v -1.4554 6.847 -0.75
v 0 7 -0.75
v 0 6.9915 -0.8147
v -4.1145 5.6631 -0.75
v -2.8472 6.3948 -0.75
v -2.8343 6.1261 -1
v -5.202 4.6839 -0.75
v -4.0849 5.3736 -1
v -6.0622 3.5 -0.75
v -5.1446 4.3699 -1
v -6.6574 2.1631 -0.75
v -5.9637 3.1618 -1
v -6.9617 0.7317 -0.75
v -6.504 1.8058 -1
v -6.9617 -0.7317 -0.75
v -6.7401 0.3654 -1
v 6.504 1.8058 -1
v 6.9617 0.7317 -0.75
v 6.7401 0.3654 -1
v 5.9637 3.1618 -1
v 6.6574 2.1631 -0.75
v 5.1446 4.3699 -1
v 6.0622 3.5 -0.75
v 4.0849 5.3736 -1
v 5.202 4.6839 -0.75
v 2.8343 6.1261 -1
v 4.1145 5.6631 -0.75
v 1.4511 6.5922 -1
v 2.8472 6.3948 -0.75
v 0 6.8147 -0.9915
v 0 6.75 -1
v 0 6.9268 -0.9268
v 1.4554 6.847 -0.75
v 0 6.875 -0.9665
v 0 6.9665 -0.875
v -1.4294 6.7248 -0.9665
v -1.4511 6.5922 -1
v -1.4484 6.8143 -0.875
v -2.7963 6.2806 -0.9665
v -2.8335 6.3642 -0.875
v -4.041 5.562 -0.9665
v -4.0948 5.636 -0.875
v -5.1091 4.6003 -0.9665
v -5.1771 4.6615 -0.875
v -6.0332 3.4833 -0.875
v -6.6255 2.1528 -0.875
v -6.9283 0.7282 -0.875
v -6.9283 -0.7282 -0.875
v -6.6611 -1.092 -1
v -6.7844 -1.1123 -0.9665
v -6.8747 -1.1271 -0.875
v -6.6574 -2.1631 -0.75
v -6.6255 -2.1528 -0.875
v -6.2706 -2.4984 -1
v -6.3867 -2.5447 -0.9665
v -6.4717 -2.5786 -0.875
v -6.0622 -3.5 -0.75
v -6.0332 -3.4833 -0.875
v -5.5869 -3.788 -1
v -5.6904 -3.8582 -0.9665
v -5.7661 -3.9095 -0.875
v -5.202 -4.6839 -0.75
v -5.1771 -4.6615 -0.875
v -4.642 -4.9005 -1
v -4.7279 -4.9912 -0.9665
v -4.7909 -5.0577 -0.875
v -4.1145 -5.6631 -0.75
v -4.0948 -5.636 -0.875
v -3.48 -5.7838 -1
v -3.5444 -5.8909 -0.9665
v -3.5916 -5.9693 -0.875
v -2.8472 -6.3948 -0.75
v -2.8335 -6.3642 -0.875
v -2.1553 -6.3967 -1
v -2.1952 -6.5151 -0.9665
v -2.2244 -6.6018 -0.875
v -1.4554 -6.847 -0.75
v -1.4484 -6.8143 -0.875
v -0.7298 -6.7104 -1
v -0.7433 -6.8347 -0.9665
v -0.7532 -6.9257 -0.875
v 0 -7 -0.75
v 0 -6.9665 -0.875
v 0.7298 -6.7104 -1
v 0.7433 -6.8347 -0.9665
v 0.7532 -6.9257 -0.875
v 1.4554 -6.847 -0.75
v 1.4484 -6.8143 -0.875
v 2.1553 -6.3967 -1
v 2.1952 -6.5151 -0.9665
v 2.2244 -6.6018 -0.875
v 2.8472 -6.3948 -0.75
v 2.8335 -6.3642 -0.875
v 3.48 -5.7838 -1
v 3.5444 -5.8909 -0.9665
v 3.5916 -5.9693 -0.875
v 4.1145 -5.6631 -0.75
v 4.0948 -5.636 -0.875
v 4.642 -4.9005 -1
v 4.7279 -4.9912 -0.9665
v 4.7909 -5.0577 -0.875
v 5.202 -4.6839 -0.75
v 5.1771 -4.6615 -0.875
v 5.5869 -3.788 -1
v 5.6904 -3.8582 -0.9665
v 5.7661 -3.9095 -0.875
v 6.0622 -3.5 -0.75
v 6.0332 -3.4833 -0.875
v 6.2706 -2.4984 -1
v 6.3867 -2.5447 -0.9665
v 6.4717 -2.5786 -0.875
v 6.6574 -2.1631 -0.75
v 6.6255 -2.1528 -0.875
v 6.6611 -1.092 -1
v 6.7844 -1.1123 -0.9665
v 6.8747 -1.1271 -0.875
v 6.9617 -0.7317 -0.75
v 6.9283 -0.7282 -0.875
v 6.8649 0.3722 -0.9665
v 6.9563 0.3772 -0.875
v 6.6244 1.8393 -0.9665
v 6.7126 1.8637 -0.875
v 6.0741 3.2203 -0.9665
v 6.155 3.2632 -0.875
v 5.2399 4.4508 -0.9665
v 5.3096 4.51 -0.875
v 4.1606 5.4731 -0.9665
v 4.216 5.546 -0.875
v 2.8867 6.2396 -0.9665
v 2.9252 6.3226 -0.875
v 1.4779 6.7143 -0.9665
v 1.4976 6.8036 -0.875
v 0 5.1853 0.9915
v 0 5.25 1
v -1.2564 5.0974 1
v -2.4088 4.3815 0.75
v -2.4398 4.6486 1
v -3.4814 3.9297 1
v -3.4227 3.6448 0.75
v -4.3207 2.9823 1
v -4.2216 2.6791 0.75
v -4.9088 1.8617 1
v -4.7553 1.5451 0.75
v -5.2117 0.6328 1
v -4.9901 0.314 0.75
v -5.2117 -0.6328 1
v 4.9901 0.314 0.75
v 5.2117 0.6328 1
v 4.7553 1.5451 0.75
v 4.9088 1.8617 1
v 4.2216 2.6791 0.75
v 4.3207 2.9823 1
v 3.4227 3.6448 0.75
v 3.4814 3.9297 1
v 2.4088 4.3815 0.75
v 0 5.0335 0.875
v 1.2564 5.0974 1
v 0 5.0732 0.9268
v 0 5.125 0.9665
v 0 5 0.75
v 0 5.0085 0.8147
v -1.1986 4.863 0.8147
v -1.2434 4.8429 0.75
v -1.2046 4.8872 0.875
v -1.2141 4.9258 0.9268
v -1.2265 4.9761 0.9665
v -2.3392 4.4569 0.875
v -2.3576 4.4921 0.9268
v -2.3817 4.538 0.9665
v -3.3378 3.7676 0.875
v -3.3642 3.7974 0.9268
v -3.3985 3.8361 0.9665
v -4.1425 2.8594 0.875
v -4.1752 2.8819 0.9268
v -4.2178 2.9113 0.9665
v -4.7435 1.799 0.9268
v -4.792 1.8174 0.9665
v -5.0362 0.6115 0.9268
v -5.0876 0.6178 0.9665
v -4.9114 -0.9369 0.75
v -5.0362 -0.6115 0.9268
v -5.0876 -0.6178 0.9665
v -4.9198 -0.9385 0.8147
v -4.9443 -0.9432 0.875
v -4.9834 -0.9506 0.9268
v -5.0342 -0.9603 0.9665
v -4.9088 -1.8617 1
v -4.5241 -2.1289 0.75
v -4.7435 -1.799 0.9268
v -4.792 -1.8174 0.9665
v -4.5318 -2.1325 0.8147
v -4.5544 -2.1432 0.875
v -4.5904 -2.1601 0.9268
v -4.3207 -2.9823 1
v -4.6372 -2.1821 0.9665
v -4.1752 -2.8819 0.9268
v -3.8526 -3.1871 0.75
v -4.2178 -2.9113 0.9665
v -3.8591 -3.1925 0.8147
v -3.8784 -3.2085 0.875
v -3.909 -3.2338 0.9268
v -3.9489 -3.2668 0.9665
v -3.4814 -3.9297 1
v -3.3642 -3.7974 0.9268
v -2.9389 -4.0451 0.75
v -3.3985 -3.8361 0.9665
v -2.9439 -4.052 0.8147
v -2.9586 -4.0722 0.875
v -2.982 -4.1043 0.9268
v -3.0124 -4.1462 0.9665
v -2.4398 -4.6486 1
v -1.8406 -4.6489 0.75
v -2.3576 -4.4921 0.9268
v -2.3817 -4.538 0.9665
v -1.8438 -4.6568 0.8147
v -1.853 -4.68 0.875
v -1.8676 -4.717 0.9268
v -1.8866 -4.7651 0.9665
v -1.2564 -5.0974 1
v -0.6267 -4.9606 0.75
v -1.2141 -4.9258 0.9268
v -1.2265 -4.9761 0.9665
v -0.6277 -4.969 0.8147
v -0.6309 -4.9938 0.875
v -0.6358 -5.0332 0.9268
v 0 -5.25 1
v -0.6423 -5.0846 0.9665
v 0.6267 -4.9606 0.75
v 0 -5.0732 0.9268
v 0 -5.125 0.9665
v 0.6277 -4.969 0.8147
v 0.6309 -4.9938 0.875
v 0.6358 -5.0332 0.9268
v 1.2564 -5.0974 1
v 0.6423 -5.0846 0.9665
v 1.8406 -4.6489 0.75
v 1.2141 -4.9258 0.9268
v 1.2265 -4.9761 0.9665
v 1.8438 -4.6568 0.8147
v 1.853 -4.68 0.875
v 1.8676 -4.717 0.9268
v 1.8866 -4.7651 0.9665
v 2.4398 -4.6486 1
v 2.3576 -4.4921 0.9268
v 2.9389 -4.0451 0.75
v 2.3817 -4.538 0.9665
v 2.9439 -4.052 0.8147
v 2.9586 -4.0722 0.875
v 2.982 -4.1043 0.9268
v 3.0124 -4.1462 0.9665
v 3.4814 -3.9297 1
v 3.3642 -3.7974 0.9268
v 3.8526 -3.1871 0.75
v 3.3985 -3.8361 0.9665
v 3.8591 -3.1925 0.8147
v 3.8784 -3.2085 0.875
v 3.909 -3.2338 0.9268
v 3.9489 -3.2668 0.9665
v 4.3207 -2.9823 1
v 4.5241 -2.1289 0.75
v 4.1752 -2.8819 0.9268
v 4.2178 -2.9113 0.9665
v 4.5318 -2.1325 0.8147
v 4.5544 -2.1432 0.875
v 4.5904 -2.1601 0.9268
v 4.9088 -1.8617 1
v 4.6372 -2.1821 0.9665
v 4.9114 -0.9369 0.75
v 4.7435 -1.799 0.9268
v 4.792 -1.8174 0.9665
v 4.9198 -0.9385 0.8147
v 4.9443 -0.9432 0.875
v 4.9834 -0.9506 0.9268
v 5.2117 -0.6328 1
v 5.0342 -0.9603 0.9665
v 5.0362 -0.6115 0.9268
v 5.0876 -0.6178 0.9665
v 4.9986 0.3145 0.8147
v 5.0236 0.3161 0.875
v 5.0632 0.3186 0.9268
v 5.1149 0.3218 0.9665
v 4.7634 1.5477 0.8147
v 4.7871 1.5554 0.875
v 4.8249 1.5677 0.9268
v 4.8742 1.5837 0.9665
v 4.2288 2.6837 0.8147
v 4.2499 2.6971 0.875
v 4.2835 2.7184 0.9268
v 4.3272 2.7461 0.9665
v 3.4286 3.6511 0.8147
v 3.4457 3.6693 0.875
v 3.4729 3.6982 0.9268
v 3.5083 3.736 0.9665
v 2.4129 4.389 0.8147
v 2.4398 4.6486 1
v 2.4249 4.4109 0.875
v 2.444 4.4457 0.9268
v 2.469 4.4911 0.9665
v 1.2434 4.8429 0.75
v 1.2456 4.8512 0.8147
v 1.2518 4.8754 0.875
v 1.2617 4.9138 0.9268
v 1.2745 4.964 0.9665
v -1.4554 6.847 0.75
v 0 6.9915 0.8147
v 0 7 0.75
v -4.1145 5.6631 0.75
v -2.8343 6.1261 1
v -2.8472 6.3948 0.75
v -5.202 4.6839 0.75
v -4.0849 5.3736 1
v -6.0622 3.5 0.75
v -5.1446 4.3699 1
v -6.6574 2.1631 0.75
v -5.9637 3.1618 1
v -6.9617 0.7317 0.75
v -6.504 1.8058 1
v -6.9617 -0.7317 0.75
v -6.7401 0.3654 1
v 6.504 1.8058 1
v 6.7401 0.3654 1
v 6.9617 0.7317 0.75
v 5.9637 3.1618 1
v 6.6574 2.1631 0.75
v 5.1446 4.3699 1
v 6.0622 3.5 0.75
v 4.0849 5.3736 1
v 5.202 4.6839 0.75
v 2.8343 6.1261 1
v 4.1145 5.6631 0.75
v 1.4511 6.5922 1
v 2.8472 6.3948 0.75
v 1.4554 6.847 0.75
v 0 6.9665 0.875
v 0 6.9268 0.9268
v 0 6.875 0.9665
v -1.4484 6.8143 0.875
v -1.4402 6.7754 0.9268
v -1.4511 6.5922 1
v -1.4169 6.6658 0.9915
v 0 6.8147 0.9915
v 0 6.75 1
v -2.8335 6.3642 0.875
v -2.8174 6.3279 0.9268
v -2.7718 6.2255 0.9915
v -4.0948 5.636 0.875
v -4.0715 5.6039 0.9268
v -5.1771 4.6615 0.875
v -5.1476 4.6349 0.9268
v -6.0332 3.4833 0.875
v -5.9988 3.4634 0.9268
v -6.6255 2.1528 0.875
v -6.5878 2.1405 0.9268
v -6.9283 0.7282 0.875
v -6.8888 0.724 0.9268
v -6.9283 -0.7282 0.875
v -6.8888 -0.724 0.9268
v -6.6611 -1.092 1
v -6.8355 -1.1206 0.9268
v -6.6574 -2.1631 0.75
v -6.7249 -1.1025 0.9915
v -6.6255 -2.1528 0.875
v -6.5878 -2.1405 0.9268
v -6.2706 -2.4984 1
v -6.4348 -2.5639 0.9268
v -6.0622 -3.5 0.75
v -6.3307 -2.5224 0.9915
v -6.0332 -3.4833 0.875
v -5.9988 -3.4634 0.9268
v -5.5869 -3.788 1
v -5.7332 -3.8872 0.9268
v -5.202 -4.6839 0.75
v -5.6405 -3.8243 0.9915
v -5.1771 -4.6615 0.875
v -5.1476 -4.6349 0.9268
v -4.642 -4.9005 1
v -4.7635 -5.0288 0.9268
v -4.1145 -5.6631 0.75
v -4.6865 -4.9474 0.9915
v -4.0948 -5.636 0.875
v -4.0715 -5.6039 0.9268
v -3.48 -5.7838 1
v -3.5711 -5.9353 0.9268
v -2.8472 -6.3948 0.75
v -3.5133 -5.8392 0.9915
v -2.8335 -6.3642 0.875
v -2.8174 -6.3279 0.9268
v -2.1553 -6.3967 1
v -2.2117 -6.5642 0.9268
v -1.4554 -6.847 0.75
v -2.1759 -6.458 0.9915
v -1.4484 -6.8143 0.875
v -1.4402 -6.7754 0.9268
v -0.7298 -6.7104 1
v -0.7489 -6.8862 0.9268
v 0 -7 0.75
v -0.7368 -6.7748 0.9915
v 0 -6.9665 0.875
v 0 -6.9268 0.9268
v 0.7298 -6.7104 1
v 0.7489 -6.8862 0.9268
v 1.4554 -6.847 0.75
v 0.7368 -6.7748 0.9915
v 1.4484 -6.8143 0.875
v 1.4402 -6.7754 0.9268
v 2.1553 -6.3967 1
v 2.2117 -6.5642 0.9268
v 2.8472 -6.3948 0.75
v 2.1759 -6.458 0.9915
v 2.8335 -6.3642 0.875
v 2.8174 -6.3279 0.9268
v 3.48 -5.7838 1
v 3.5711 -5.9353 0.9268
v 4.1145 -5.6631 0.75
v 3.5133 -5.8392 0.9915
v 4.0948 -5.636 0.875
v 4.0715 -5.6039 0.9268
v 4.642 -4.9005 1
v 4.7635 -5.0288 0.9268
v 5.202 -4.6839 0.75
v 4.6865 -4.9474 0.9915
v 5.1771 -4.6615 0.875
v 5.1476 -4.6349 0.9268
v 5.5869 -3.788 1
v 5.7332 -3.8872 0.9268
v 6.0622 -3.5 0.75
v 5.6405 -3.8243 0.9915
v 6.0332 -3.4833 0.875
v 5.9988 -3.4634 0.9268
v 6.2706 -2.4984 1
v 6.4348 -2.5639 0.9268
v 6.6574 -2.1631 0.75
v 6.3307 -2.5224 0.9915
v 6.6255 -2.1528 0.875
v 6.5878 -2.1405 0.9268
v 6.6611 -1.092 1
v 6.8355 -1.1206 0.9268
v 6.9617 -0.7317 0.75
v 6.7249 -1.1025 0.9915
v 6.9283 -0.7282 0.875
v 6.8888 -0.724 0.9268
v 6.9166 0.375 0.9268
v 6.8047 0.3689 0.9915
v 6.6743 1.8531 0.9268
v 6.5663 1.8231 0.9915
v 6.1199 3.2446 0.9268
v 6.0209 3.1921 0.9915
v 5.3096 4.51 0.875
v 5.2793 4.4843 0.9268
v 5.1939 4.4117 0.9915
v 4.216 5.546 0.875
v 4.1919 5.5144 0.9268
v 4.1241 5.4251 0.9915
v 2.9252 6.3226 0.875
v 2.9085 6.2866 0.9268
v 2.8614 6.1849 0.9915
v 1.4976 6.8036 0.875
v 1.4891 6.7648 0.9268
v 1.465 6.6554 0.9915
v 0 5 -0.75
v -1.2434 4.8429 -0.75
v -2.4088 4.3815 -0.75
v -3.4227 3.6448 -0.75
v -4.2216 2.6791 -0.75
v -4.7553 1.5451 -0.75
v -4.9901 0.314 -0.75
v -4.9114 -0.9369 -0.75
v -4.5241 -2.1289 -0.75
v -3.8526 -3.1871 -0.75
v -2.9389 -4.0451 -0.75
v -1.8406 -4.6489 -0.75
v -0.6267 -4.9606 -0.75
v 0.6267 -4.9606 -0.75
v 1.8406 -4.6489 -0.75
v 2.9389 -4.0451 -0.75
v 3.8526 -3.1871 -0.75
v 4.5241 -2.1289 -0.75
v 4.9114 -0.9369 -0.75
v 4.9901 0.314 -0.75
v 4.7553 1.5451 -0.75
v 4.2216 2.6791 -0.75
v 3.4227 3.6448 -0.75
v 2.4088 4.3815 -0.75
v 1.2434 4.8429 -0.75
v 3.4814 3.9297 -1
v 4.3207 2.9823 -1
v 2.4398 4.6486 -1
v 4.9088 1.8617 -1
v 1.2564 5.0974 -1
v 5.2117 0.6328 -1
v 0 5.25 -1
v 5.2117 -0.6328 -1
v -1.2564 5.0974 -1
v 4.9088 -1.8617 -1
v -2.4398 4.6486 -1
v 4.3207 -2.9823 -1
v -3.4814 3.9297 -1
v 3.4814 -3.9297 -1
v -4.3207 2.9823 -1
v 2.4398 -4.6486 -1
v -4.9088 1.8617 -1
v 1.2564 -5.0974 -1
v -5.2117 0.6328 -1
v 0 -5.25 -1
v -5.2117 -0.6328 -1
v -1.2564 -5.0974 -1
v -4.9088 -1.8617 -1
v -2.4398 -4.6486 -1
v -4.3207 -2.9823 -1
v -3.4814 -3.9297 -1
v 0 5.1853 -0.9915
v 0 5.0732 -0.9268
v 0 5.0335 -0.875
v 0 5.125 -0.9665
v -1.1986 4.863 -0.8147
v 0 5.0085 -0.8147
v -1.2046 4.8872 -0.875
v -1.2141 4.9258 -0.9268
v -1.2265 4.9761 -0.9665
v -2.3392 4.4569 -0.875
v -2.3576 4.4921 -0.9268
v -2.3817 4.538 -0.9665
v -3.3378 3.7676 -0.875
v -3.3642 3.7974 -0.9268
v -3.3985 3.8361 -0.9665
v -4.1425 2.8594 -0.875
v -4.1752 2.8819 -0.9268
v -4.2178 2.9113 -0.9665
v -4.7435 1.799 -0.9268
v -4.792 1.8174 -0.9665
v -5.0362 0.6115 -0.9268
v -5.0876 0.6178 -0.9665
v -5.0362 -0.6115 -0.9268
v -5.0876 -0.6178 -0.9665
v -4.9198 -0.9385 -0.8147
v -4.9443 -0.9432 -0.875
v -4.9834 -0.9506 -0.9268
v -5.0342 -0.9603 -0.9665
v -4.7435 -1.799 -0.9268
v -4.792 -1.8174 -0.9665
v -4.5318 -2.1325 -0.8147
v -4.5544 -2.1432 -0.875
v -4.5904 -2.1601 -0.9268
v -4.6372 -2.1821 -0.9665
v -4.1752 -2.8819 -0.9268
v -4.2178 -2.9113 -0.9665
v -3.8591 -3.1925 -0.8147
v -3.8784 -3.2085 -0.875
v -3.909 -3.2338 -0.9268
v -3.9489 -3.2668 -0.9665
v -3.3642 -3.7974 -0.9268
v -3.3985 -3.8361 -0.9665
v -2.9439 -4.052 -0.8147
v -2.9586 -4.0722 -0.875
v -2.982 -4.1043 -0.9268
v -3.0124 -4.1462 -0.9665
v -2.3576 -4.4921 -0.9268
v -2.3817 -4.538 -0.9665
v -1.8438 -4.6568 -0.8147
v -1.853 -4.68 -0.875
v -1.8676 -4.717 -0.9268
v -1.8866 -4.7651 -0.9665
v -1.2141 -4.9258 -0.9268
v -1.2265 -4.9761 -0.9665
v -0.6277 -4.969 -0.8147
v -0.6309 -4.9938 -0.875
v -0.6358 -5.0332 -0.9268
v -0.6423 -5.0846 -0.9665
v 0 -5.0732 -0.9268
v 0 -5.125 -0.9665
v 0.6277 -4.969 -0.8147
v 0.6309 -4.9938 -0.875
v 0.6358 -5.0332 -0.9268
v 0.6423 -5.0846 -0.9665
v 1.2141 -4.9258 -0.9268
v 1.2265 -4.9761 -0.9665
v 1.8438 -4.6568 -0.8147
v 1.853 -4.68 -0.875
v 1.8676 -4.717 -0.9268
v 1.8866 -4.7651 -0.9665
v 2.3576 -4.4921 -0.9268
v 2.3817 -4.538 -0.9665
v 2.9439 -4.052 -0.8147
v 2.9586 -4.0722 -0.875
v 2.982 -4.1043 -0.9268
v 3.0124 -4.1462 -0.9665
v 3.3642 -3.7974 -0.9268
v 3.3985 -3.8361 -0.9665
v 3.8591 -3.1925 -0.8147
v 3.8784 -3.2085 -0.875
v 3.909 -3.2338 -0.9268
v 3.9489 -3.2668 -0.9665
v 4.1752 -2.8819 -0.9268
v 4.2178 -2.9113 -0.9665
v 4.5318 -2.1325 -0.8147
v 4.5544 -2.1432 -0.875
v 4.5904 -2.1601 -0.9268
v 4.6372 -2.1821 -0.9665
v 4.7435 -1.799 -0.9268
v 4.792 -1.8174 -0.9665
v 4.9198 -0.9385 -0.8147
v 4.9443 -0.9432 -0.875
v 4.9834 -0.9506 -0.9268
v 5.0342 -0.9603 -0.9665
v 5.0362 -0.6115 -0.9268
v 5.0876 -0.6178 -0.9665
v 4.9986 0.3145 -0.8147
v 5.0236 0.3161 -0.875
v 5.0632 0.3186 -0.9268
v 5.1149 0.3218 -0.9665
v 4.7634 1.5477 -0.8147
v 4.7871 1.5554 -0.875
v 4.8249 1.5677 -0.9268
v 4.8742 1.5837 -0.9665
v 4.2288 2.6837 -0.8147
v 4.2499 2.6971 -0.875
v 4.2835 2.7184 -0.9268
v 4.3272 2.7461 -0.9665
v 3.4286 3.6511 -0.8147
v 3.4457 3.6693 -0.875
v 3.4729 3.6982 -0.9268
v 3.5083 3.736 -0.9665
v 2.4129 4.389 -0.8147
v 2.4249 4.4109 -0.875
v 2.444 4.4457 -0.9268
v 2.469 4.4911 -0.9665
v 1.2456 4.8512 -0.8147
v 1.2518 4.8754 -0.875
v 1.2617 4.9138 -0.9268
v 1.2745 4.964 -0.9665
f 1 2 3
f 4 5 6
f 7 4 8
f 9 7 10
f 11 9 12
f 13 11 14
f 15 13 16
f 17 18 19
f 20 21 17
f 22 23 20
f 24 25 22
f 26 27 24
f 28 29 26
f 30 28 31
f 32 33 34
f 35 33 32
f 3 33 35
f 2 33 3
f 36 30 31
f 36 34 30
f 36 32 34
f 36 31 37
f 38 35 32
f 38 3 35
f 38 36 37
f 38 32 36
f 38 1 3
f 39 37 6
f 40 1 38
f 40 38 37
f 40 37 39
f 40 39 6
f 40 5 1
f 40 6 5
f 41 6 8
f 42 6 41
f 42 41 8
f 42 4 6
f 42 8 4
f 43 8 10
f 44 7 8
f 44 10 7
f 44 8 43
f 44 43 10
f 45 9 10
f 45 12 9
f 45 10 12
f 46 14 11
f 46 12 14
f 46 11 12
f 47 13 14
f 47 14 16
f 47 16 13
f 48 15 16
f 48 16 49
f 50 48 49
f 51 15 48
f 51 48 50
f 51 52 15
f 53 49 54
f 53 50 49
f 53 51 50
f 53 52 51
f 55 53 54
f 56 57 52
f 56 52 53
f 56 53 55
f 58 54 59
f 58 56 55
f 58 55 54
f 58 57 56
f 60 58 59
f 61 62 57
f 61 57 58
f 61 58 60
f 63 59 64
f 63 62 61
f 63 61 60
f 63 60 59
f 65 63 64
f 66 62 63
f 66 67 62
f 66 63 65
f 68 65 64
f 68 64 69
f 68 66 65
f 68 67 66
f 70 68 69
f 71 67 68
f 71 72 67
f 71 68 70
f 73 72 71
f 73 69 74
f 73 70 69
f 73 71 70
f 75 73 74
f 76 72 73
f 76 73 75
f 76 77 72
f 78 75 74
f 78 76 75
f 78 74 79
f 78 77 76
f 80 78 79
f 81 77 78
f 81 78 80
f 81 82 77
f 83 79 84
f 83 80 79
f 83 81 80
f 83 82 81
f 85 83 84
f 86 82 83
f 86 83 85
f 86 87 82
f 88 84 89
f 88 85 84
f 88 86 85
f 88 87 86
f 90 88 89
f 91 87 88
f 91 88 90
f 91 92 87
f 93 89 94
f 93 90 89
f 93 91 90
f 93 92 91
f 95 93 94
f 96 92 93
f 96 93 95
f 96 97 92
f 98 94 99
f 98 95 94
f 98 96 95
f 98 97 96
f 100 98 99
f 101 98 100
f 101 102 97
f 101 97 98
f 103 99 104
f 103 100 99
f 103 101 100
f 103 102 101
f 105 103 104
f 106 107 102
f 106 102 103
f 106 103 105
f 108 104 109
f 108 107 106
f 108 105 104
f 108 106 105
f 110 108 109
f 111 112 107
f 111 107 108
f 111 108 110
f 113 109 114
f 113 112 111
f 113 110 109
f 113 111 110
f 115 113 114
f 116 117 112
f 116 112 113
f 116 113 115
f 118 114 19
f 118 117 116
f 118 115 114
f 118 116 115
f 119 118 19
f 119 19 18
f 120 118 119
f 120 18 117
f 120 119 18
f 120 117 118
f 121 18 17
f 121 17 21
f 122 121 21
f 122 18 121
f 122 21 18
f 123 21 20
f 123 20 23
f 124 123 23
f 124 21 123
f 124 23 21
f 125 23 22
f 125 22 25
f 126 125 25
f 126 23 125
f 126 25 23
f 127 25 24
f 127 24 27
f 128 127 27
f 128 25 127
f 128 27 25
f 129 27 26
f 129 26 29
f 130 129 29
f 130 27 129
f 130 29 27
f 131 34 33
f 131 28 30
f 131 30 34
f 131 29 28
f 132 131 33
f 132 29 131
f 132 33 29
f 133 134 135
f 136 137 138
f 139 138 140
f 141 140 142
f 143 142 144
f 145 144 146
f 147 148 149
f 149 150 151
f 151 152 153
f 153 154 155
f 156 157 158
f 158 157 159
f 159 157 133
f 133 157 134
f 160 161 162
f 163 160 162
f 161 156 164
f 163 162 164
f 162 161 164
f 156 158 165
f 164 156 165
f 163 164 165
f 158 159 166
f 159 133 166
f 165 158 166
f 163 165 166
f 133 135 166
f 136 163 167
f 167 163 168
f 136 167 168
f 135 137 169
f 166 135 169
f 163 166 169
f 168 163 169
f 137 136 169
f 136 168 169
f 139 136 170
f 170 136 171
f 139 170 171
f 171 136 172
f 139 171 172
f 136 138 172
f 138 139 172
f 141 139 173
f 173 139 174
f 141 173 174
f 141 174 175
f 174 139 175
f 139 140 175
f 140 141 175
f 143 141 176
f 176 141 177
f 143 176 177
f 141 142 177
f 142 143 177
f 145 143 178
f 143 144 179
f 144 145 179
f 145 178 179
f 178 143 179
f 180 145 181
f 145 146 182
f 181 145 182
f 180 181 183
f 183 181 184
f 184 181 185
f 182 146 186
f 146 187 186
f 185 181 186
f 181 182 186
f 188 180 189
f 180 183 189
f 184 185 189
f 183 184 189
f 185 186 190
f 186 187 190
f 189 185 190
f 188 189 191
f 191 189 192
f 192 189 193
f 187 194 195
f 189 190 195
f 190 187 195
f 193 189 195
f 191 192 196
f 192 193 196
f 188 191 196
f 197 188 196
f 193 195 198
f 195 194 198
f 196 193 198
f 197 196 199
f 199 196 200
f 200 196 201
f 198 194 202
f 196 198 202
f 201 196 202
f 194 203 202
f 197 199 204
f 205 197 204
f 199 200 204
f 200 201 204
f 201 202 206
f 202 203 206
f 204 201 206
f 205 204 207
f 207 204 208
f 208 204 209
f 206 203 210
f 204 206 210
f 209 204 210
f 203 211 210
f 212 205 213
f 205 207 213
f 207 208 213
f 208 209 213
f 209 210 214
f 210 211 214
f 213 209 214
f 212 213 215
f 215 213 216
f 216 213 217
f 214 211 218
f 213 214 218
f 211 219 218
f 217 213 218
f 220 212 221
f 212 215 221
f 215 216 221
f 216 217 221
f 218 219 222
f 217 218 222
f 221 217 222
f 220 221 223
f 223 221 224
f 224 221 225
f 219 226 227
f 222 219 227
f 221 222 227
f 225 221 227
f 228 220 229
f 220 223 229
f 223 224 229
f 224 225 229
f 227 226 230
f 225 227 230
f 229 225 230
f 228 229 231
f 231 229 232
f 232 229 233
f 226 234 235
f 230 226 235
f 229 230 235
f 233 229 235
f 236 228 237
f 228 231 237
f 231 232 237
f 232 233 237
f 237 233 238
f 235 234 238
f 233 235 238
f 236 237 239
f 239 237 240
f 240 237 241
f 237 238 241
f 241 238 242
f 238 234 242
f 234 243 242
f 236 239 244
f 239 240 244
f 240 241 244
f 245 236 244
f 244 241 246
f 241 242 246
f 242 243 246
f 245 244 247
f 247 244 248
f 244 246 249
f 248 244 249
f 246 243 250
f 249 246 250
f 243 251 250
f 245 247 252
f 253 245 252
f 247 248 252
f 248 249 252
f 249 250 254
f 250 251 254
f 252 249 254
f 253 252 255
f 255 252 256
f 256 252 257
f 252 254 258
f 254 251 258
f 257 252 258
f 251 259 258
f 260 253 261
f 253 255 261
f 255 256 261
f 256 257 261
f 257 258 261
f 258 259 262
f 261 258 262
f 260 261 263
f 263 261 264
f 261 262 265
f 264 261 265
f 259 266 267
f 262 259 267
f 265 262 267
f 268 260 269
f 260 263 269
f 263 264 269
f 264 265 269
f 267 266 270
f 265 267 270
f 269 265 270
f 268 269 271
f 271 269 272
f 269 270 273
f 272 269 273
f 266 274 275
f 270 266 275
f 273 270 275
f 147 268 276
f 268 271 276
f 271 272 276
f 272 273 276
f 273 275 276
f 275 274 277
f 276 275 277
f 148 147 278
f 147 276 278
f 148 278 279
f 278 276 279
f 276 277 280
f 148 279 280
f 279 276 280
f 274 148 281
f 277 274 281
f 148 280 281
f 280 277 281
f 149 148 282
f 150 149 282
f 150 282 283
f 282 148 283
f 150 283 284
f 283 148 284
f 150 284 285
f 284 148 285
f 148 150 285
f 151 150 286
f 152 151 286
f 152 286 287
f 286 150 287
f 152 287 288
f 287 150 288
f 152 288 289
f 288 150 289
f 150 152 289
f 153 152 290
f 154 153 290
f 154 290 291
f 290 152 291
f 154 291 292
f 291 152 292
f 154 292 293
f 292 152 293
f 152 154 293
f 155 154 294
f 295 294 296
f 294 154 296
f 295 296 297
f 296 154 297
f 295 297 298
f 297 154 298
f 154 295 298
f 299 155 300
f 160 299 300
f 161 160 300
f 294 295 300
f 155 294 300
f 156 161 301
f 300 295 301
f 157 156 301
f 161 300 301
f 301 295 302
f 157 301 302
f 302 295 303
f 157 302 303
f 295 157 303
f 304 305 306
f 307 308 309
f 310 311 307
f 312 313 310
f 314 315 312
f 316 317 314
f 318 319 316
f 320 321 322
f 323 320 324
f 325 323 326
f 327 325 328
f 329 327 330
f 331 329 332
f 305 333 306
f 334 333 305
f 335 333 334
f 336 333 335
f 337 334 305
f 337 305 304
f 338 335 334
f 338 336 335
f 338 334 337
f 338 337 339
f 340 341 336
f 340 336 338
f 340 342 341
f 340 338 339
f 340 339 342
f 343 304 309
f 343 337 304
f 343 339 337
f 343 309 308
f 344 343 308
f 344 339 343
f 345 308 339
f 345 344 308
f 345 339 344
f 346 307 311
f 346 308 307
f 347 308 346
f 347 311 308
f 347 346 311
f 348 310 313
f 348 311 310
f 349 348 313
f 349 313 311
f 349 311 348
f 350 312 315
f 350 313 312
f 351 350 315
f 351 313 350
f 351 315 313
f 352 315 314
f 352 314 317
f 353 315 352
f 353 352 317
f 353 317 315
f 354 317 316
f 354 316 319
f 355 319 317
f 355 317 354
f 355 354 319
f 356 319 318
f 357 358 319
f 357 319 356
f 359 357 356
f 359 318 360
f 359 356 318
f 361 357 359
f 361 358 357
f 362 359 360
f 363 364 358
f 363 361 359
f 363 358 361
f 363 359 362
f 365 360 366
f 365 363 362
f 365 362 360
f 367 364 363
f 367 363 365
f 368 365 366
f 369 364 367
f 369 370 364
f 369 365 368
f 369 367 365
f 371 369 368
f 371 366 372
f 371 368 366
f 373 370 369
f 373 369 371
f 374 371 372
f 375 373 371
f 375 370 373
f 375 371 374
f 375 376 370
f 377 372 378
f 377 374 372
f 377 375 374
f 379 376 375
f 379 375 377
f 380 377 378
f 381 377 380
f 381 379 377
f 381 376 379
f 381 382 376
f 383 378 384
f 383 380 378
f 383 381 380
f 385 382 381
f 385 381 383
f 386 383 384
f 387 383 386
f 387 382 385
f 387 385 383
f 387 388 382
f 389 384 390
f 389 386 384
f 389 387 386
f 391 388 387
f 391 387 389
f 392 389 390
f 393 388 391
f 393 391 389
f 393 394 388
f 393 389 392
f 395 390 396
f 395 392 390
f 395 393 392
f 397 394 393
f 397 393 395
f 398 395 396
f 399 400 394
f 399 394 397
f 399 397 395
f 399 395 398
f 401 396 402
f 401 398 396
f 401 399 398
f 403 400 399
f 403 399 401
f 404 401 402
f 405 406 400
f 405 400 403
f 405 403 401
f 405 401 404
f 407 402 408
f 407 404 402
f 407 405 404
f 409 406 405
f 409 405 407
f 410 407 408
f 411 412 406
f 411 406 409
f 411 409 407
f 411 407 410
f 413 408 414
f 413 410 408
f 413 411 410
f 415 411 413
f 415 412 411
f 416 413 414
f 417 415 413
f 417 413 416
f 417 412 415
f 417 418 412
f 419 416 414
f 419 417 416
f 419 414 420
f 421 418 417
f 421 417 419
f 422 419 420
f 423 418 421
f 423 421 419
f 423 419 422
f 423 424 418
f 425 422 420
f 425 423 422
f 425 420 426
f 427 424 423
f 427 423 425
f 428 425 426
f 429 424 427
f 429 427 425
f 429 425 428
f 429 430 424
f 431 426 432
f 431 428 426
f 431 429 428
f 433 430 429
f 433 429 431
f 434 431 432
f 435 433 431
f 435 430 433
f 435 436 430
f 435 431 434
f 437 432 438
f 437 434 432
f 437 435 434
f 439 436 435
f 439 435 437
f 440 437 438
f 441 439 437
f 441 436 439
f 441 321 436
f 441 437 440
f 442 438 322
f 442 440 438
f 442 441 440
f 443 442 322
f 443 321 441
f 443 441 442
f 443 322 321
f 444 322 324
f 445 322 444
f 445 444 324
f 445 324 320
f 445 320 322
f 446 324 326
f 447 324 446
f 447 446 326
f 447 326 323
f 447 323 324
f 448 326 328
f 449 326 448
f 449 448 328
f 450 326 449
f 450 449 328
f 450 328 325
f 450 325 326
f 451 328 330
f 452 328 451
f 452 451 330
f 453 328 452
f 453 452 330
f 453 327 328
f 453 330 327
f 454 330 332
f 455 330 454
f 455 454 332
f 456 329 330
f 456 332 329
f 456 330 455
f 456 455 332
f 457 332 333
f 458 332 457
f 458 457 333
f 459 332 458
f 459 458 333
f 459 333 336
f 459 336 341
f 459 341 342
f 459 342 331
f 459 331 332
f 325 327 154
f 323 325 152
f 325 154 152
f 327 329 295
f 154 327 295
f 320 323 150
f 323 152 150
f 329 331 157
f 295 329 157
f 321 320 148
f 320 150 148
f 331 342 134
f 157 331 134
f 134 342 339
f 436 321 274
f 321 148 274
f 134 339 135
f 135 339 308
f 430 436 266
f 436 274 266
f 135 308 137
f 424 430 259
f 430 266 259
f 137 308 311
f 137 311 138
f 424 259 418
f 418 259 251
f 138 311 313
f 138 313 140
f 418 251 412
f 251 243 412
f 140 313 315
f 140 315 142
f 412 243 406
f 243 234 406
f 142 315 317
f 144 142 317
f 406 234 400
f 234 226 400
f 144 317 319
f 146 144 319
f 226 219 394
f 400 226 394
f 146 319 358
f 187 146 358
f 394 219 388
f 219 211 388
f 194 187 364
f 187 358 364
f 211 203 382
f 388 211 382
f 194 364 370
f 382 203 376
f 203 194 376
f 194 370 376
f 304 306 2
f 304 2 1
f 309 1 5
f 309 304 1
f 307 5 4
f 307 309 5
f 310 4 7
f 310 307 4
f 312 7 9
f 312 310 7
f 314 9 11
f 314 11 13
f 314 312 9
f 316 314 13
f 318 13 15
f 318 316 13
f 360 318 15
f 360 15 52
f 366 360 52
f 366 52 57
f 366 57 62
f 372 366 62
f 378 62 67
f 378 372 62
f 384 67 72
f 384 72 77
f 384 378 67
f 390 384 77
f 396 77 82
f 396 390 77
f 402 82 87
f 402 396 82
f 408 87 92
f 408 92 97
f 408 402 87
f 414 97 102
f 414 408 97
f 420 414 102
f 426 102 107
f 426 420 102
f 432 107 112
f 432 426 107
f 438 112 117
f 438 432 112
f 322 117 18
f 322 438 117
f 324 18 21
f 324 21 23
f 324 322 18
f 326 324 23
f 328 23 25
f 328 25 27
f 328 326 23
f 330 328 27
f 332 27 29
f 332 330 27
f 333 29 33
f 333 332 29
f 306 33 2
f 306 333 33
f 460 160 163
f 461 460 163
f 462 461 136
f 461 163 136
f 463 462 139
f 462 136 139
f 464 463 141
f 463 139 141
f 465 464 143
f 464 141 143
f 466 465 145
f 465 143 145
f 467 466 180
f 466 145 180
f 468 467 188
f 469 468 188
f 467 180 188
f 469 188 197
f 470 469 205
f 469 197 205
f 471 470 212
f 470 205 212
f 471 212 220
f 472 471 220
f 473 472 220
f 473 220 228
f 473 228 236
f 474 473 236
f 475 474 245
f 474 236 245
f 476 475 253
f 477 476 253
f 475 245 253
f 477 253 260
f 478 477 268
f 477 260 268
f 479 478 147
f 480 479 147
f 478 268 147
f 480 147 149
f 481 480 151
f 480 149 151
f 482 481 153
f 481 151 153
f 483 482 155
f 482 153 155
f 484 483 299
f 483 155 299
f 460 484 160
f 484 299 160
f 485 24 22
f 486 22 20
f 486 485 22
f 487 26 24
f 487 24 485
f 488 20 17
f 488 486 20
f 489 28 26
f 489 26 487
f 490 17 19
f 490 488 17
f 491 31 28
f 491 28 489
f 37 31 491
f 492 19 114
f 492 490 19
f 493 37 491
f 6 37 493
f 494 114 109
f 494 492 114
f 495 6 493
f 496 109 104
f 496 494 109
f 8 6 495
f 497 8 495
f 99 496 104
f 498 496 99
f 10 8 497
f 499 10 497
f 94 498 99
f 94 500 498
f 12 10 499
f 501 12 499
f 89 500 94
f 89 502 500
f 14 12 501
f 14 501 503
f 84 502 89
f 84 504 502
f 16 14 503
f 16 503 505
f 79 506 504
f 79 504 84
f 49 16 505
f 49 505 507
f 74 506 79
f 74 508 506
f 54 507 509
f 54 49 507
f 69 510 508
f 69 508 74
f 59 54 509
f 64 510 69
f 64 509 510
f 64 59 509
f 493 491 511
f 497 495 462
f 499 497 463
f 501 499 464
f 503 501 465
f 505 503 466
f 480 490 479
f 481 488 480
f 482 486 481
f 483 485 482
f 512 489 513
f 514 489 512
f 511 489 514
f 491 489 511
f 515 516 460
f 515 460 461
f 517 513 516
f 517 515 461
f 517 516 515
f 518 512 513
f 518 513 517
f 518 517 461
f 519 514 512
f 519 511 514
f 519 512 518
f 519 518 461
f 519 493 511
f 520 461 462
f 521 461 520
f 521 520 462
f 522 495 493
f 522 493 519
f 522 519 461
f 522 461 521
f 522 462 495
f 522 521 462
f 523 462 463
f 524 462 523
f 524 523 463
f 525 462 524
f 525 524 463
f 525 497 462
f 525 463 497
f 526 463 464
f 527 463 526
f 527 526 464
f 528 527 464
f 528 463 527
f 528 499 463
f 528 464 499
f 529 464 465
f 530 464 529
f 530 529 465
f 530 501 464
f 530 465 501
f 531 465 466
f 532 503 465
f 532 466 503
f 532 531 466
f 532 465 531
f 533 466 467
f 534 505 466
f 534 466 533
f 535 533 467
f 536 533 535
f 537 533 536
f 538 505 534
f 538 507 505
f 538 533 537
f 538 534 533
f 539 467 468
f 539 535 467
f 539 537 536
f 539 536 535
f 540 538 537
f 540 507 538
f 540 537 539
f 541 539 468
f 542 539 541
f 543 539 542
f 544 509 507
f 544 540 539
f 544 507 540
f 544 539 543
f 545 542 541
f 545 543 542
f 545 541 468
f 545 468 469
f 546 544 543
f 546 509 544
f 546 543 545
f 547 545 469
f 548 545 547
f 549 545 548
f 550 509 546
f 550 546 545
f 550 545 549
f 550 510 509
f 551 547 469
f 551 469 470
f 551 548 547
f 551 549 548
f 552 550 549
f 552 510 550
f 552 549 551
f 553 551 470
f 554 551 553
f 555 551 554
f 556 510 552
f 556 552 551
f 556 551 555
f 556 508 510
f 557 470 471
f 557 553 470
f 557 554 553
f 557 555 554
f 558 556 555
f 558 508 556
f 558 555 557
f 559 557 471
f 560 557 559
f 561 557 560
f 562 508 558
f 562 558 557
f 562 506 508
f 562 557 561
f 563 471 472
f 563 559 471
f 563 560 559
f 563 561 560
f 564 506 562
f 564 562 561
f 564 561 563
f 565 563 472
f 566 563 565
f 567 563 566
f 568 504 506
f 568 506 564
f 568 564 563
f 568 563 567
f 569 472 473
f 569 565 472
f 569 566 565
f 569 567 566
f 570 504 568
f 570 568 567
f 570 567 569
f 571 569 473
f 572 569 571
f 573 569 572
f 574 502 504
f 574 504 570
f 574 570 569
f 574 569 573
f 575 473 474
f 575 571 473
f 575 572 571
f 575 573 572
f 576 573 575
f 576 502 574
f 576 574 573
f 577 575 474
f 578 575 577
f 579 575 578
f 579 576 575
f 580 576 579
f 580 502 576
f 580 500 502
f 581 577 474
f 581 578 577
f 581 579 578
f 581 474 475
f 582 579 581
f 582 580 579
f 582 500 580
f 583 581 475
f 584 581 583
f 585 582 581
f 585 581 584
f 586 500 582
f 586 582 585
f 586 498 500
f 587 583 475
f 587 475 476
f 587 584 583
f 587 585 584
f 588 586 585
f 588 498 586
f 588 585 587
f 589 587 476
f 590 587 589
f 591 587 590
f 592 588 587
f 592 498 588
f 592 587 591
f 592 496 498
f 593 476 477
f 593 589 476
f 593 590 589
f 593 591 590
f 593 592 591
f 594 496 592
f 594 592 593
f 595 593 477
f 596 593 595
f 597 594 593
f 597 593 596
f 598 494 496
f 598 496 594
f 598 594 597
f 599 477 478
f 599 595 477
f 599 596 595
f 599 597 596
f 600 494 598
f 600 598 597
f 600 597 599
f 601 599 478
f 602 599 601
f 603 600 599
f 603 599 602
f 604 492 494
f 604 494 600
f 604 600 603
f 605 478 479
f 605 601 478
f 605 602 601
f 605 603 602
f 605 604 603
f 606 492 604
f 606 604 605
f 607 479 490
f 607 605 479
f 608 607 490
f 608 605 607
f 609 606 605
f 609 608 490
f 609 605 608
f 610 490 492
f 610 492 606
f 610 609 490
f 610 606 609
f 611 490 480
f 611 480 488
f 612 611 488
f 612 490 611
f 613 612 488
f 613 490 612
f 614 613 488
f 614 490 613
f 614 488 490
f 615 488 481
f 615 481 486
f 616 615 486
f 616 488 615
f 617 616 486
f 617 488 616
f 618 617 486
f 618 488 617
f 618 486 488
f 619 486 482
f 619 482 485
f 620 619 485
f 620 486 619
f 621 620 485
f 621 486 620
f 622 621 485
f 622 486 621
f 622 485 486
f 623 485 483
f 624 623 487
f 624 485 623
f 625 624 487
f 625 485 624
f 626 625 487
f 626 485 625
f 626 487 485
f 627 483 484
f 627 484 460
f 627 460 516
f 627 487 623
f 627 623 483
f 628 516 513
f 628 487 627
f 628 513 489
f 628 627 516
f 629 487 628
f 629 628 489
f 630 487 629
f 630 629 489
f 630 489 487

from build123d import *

# Parameters (mm, degrees)
F1_W = 2
F1_H = 2
F3_R = 0.25


with BuildPart() as f2:
    # F1 (on Right) → F2 (revolve)
    with BuildSketch(Plane.YZ):
        with Locations((6, 0)):
            Rectangle(F1_W, F1_H)
    revolve(axis=Axis((0, 0, 8.067548), (0, 0, 1)))

    # F3
    f3_edges = [f2.edges().sort_by_distance(p)[0] for p in [
        (0, -7, 1),
        (0, -5, 1),
        (0, -7, -1),
        (0, -5, -1),
    ]]
    fillet(f3_edges, radius=F3_R)


solid = f2.part
